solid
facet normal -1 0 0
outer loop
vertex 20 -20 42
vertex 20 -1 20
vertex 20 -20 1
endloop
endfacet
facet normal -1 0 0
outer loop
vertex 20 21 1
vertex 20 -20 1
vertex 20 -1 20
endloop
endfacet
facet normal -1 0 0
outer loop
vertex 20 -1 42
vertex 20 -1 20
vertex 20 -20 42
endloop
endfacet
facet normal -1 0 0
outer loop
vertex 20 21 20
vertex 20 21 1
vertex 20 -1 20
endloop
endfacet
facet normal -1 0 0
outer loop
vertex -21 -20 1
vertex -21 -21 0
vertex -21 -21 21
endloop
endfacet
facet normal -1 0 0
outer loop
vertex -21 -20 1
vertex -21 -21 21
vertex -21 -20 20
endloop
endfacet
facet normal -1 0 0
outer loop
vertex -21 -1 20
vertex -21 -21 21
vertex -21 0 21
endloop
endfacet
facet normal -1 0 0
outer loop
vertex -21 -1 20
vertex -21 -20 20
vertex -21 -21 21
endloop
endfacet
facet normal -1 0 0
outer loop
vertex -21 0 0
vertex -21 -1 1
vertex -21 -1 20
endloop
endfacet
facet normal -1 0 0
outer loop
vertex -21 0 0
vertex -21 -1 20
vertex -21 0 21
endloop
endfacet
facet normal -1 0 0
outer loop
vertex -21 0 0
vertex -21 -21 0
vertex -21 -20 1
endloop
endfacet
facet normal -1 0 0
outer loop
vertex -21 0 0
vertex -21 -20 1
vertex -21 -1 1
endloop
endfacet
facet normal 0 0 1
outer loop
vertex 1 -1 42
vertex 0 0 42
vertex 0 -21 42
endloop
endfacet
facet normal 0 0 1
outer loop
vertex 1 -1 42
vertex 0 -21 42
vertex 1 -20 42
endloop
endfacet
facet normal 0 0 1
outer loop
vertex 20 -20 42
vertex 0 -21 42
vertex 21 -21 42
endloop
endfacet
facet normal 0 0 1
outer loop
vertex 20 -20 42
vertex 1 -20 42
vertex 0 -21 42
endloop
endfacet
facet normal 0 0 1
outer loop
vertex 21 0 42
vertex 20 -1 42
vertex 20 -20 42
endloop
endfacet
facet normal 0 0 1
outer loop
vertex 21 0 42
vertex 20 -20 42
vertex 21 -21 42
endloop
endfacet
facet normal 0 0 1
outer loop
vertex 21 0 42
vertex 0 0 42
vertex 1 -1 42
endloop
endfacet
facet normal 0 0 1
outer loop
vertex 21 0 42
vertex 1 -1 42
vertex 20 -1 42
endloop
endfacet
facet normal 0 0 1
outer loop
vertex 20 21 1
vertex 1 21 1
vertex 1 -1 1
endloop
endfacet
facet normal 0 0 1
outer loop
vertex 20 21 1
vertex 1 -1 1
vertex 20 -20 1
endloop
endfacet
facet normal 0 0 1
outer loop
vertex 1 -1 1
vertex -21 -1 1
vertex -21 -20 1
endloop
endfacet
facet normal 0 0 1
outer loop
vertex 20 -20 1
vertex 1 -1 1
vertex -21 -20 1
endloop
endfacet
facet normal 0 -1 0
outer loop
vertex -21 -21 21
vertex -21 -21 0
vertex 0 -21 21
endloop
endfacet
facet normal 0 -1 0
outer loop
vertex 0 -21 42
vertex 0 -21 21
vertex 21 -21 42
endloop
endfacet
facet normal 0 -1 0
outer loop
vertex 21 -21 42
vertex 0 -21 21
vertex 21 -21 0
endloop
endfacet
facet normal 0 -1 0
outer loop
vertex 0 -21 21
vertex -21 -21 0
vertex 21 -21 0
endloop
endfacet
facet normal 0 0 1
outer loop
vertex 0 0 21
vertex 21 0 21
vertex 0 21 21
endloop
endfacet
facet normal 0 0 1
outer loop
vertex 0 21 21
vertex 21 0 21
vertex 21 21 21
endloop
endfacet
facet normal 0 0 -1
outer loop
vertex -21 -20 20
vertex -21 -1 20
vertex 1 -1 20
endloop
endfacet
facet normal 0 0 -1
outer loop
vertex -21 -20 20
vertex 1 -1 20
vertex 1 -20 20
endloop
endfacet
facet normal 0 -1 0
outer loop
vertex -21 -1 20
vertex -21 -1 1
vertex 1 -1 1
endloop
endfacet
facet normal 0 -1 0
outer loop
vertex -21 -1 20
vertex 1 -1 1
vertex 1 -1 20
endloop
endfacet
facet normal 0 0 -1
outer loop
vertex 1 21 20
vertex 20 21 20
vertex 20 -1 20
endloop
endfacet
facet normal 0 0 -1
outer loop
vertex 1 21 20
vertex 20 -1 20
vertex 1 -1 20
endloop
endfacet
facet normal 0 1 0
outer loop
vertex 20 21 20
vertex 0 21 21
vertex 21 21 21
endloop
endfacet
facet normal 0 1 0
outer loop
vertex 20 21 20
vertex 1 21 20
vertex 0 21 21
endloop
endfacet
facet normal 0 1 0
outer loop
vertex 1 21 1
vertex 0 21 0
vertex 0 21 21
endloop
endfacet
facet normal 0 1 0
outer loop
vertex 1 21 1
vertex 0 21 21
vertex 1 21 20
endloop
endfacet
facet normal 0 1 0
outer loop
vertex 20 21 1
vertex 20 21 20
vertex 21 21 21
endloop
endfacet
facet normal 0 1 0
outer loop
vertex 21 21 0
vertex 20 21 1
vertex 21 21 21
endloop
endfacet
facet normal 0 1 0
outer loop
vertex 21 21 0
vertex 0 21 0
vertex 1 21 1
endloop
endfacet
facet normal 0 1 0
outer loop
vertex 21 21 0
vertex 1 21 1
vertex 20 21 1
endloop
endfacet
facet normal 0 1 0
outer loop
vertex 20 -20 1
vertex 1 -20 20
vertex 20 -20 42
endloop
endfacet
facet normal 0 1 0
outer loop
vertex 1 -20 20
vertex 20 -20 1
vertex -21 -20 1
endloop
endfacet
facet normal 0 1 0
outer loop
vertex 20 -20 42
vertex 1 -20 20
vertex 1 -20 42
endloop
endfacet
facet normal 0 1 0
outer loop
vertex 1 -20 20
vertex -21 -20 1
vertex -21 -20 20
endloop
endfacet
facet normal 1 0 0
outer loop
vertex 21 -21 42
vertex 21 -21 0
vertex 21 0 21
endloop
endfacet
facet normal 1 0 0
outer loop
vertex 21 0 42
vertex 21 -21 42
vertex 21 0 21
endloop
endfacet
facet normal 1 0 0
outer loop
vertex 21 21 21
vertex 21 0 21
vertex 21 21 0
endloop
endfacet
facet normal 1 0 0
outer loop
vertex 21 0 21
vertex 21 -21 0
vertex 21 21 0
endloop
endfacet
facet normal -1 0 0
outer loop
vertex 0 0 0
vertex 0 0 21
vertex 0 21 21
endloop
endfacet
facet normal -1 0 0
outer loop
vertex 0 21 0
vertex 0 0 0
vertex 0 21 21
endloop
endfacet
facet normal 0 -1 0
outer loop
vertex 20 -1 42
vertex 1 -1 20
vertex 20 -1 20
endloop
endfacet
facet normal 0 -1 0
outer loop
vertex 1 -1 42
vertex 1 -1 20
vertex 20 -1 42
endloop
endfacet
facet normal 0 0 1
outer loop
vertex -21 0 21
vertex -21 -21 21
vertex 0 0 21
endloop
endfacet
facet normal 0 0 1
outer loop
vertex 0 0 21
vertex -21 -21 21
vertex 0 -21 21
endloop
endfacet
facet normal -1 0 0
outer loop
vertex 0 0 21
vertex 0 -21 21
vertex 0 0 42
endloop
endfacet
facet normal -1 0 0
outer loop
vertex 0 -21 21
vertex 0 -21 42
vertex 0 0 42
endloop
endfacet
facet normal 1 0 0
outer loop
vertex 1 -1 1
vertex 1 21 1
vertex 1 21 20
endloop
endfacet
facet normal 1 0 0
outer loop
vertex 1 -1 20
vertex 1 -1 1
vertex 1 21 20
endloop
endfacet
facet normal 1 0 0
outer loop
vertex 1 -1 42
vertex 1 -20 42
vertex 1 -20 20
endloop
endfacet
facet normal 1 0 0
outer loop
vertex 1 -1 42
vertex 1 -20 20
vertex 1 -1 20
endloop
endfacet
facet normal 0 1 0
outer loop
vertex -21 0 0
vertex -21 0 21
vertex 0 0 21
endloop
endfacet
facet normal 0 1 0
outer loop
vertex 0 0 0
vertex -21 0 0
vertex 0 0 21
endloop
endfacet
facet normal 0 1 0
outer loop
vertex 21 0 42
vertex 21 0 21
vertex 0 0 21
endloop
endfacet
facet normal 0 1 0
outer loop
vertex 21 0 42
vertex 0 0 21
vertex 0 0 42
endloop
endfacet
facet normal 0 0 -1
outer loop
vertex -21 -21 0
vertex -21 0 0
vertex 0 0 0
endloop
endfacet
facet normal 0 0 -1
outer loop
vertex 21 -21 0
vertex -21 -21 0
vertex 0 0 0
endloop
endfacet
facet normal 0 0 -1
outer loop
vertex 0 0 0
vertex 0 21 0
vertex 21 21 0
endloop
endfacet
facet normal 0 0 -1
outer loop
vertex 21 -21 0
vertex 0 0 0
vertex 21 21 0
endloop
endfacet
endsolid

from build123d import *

# Parameters (mm, degrees)
F0_W      = 42
F0_H      = 42
F1_DEPTH  = 42
F2_W      = 21
F2_H      = 21
F3_DEPTH  = 42
F4_W      = 21
F4_H      = 21
F5_DEPTH  = 21
F6_W      = 21
F6_H      = 21
F7_DEPTH  = 21
F8_W      = 19
F8_H      = 19
F9_DEPTH  = 41
F10_W     = 19
F10_H     = 19
F11_DEPTH = 41
F12_W     = 19
F12_H     = 19
F13_DEPTH = 41


with BuildPart() as f1:
    # F0 (on Top) → F1 (new body)
    with BuildSketch(Plane.XY):
        Rectangle(F0_W, F0_H)
    extrude(amount=F1_DEPTH)

    # F2 (on face) → F3 (cut, through all)
    with BuildSketch(Plane.XY.offset(42)):
        with Locations((-10.5, 10.5)):
            Rectangle(F2_W, F2_H)
    extrude(amount=-F3_DEPTH, mode=Mode.SUBTRACT)

    # F4 (on face) → F5 (cut, through all)
    with BuildSketch(Plane.XZ.offset(21)):
        with Locations((-10.5, 31.5)):
            Rectangle(F4_W, F4_H)
    extrude(amount=-F5_DEPTH, mode=Mode.SUBTRACT)

    # F6 (on face) → F7 (cut, through all)
    with BuildSketch(Plane.YZ.offset(21)):
        with Locations((10.5, 31.5)):
            Rectangle(F6_W, F6_H)
    extrude(amount=-F7_DEPTH, mode=Mode.SUBTRACT)

    # F8 (on face) → F9 (cut)
    with BuildSketch(Plane.XY.offset(42)):
        with Locations((10.5, -10.5)):
            Rectangle(F8_W, F8_H)
    extrude(amount=-F9_DEPTH, mode=Mode.SUBTRACT)

    # F10 (on face) → F11 (cut)
    with BuildSketch(Plane(origin=(-21, 0, 0), x_dir=(0, -1, 0), z_dir=(-1, 0, 0))):
        with Locations((10.5, 10.5)):
            Rectangle(F10_W, F10_H)
    extrude(amount=-F11_DEPTH, mode=Mode.SUBTRACT)

    # F12 (on face) → F13 (cut)
    with BuildSketch(Plane(origin=(0, 21, 0), x_dir=(-1, 0, 0), z_dir=(0, 1, 0))):
        with Locations((-10.5, 10.5)):
            Rectangle(F12_W, F12_H)
    extrude(amount=-F13_DEPTH, mode=Mode.SUBTRACT)


solid = f1.part
